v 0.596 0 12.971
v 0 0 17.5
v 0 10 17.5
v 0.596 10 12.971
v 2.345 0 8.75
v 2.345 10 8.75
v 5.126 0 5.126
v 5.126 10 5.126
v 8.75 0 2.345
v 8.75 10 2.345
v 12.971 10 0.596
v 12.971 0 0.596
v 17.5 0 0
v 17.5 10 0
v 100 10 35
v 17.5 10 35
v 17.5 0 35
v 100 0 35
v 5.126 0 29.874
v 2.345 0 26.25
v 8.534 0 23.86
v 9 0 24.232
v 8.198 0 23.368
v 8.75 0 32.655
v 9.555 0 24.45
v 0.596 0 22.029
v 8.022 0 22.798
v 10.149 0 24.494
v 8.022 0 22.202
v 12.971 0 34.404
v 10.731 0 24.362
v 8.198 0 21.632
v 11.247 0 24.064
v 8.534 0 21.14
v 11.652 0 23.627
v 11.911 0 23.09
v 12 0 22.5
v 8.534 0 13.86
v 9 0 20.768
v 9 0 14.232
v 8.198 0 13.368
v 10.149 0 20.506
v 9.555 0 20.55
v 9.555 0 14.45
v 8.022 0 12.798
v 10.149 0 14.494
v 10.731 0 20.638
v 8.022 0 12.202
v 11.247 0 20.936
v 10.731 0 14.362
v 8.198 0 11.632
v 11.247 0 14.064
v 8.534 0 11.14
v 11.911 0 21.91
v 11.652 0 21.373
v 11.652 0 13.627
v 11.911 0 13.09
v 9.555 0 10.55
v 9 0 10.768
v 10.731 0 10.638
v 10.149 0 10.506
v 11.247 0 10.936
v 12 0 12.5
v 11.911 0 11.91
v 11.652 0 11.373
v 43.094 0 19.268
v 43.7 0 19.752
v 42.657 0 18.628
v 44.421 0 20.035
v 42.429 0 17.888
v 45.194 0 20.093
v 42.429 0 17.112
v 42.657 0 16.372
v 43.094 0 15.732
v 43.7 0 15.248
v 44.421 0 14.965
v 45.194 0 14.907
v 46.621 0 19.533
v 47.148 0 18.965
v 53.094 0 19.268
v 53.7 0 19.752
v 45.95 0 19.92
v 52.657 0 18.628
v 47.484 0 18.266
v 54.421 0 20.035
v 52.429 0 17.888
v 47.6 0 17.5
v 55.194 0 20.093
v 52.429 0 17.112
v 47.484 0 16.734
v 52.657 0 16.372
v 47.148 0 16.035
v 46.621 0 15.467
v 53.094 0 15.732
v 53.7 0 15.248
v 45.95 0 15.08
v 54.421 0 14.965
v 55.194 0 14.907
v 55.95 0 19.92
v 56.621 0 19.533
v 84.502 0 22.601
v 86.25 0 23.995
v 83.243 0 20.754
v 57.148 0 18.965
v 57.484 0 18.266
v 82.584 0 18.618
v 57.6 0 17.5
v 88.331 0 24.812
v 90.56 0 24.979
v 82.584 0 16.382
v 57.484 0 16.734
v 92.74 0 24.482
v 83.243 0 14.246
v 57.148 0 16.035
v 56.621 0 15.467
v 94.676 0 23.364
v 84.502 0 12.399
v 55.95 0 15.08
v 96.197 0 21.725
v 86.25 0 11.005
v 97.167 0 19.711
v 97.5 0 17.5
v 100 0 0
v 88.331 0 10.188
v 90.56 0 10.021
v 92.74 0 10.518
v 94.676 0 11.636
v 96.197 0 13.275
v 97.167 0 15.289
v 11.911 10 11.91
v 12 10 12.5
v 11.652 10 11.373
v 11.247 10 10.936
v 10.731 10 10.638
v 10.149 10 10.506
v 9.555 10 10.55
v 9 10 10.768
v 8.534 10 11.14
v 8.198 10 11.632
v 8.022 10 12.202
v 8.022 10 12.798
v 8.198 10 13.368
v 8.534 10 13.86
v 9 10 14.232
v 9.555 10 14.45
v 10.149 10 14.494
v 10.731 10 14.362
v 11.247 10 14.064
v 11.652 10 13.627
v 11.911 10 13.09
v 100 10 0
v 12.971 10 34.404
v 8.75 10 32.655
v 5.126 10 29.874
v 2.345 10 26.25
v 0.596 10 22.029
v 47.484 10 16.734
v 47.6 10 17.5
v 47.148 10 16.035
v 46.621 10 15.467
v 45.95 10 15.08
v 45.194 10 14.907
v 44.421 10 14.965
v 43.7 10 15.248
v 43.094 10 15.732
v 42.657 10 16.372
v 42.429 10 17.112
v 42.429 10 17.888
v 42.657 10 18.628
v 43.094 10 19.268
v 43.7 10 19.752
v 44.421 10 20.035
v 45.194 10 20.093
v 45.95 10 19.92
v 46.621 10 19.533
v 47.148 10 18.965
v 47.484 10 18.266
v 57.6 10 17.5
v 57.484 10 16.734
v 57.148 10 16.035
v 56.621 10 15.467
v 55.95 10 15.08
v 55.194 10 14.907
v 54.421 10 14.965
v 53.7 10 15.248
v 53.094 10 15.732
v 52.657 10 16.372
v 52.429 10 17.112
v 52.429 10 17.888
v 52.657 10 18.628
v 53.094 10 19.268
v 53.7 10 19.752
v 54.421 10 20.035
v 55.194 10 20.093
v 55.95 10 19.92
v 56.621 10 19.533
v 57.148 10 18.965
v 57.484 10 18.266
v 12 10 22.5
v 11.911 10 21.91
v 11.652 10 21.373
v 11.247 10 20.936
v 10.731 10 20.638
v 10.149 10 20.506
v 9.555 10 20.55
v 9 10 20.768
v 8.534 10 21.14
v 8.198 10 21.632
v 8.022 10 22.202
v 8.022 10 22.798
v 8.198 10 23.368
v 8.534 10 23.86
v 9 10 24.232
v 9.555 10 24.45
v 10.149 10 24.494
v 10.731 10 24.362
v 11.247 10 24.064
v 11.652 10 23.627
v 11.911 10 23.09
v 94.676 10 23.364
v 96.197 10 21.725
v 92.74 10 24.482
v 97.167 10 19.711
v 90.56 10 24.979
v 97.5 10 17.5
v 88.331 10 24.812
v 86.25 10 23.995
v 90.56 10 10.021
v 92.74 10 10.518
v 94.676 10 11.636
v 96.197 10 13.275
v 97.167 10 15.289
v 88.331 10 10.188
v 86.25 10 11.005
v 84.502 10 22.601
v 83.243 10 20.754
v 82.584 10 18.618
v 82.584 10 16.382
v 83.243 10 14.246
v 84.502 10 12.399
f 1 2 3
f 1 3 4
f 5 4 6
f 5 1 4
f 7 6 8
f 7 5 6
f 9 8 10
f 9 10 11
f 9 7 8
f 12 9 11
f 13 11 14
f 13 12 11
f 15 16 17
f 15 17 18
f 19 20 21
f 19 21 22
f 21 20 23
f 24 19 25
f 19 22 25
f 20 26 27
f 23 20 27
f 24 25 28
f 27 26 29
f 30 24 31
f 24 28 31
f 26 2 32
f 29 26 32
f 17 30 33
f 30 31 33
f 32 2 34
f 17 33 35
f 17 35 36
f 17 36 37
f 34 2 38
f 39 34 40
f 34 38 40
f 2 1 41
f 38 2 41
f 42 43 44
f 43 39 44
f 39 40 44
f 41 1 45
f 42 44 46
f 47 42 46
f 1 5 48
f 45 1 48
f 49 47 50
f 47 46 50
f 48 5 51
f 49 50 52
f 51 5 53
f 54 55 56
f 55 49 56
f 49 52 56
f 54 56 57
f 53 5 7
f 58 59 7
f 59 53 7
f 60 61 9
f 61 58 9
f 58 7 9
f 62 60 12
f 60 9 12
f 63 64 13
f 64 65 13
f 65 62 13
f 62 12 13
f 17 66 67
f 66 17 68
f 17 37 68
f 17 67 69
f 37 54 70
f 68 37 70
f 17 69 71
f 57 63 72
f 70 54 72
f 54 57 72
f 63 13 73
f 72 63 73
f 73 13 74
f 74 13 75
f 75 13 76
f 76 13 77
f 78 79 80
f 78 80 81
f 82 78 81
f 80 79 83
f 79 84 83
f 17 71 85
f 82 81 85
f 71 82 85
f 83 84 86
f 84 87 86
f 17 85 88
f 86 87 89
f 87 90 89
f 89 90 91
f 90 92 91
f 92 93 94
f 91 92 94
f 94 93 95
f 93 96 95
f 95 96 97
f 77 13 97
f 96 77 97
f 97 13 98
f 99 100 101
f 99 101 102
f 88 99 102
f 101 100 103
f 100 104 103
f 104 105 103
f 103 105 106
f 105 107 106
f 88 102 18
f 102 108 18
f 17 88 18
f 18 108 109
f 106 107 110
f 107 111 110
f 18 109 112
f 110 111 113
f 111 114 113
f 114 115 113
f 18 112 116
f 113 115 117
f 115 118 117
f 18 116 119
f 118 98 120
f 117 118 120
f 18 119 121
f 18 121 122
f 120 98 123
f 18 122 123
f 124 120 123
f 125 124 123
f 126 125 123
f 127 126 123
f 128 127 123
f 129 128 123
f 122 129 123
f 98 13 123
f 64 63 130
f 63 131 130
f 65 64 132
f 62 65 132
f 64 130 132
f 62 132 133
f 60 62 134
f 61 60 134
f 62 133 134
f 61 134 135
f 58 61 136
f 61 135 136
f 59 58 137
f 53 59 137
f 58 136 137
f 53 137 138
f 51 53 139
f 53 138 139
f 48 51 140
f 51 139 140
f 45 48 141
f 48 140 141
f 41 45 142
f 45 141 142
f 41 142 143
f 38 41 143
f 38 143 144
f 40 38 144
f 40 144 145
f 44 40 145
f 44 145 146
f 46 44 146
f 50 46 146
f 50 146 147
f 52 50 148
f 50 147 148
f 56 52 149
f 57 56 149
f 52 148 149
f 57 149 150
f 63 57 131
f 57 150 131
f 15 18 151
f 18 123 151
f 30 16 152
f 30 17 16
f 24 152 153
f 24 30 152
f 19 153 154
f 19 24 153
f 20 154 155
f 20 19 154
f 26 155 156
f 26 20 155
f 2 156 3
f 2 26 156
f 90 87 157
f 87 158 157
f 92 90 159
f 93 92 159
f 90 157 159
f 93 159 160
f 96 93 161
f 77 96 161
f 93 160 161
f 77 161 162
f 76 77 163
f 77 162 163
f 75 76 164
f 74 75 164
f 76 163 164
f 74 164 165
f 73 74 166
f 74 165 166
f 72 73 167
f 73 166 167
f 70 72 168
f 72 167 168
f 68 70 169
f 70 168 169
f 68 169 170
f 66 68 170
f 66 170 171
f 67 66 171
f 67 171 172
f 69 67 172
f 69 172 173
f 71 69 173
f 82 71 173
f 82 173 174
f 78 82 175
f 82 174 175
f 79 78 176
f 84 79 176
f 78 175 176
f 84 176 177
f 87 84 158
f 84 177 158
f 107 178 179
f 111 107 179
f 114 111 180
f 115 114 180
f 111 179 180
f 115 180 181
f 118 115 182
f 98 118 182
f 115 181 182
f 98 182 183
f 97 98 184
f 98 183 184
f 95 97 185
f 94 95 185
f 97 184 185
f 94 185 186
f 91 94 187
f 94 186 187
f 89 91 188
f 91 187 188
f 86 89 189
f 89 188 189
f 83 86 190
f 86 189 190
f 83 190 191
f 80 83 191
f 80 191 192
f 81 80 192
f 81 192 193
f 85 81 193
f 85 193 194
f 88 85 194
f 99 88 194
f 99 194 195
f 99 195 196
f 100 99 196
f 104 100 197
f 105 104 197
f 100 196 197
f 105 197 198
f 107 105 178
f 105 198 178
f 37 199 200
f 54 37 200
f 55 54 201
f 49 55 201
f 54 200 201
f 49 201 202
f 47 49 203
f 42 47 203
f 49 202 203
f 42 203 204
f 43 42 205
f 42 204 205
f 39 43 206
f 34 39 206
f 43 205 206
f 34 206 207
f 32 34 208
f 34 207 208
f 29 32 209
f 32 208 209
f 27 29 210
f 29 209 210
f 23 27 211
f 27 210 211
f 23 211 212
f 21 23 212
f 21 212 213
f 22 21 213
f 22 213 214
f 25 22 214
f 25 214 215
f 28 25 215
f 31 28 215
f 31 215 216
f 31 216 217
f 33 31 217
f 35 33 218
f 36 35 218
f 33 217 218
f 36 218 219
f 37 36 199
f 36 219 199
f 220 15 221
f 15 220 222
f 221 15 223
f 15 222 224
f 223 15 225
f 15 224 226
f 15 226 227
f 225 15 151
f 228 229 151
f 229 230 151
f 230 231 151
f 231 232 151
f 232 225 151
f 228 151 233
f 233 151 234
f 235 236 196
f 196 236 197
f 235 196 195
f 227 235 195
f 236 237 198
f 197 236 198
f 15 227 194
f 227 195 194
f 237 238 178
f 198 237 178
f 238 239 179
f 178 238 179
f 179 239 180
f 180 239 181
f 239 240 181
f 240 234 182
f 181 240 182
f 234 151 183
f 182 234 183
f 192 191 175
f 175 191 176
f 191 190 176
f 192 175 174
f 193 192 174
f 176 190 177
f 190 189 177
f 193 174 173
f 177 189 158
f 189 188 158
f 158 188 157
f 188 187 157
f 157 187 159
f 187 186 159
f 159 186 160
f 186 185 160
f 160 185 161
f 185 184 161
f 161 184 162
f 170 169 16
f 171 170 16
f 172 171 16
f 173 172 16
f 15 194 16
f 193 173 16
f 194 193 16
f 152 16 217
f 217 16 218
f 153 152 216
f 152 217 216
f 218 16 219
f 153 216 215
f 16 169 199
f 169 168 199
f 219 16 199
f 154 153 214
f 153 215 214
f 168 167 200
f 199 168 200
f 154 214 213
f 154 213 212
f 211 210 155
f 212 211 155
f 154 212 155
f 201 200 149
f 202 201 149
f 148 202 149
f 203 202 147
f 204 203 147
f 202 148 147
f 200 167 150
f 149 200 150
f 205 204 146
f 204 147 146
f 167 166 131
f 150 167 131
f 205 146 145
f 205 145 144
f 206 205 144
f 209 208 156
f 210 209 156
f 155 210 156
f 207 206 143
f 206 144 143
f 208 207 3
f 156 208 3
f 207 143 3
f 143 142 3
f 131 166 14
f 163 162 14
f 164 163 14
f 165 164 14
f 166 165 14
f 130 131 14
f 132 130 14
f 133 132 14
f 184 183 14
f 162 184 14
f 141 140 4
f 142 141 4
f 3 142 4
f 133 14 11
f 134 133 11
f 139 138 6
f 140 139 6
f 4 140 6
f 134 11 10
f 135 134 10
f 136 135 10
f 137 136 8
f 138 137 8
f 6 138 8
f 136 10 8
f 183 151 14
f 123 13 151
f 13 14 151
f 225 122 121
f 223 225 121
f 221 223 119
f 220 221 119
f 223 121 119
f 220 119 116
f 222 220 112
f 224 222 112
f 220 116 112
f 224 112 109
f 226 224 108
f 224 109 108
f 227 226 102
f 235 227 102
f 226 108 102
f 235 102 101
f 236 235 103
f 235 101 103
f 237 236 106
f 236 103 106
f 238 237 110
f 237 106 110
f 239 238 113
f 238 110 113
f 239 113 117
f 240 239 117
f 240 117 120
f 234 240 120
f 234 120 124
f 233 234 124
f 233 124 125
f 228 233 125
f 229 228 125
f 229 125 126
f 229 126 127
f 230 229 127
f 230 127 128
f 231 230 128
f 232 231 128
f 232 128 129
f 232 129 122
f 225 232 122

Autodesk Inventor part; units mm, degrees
sketch "스케치1" plane through (0, 0, 0) normal (0, 0, 1) x (1, 0, 0)
  line L0 (0, 0) -> (100, 0)
  line L1 (100, 0) -> (100, 10)
  line L2 (100, 10) -> (0, 10)
  line L3 (0, 10) -> (0, 0)
  dimension "d0" = 100
  dimension "d1" = 10
extrude "돌출1" add sketch "스케치1" along normal blind 35
sketch "스케치3" plane through (0, 0, 0) normal (0, -1, 0) x (1, 0, 0)
  line L0 (0, 0) -> (100, 0) projected
  line L1 (100, 0) -> (100, 35) projected
  line L2 (0, 35) -> (100, 35) projected
  line L3 (0, 0) -> (0, 35) projected
  circle A0 centre (90, 17.5) radius 7.5
  point P0 (15, 17.5)
  point P1 (100, 17.5)
  dimension "d8" = 15
  dimension "d12" = 10
extrude "돌출3" cut sketch "스케치3" against normal through all contours A0
ref_plane "작업 평면1" through (50, 0, 0) normal (-1, 0, 0) x (0, 0, 1)
ref_plane "작업 평면2" through (65, 40, 45) normal (0, 1, 0) x (1, 0, 0)
ref_plane "작업 평면3" through (50, 0, 0) normal (1, 0, 0) x (0, 0, -1)
sketch "스케치4" plane through (0, 10, 0) normal (0, 1, 0) x (1, 0, 0)
  circle A0 centre (90, -17.5) radius 7.5 projected
  line L0 (100, 0) -> (0, 0) projected
  line L1 (0, 0) -> (0, -35) projected
  line L2 (100, -35) -> (0, -35) projected
  line L3 (100, 0) -> (100, -35) projected
  circle A1 centre (45, -17.5) radius 2.6
  circle A2 centre (55, -17.5) radius 2.6
  line L4 (100, 0) -> (0, 0) projected
  point P0 (50, 0)
  point P1 (50, 0)
  point P2 (100, -17.5)
  dimension "d16" = 5.2
  dimension "d17" = 5.2
  dimension "d18" = 10
  dimension "d19" = 5
extrude "돌출4" cut sketch "스케치4" against normal through all contours A1 | A2
sketch "스케치5" plane through (0, 10, 0) normal (0, 1, 0) x (1, 0, 0)
  circle A0 centre (10, -12.5) radius 2
  circle A1 centre (10, -22.5) radius 2
  line L0 (0, 0) -> (0, -35) projected
  point P0 (0, -17.5)
  dimension "d20" = 4
  dimension "d21" = 4
  dimension "d22" = 10
  dimension "d23" = 5
  dimension "d24" = 10
extrude "돌출5" cut sketch "스케치5" against normal through all
fillet "모깎기1" radius 17.5 2 edges at (0, 5, 0) (0, 5, 35)
properties part number "다리-2"
